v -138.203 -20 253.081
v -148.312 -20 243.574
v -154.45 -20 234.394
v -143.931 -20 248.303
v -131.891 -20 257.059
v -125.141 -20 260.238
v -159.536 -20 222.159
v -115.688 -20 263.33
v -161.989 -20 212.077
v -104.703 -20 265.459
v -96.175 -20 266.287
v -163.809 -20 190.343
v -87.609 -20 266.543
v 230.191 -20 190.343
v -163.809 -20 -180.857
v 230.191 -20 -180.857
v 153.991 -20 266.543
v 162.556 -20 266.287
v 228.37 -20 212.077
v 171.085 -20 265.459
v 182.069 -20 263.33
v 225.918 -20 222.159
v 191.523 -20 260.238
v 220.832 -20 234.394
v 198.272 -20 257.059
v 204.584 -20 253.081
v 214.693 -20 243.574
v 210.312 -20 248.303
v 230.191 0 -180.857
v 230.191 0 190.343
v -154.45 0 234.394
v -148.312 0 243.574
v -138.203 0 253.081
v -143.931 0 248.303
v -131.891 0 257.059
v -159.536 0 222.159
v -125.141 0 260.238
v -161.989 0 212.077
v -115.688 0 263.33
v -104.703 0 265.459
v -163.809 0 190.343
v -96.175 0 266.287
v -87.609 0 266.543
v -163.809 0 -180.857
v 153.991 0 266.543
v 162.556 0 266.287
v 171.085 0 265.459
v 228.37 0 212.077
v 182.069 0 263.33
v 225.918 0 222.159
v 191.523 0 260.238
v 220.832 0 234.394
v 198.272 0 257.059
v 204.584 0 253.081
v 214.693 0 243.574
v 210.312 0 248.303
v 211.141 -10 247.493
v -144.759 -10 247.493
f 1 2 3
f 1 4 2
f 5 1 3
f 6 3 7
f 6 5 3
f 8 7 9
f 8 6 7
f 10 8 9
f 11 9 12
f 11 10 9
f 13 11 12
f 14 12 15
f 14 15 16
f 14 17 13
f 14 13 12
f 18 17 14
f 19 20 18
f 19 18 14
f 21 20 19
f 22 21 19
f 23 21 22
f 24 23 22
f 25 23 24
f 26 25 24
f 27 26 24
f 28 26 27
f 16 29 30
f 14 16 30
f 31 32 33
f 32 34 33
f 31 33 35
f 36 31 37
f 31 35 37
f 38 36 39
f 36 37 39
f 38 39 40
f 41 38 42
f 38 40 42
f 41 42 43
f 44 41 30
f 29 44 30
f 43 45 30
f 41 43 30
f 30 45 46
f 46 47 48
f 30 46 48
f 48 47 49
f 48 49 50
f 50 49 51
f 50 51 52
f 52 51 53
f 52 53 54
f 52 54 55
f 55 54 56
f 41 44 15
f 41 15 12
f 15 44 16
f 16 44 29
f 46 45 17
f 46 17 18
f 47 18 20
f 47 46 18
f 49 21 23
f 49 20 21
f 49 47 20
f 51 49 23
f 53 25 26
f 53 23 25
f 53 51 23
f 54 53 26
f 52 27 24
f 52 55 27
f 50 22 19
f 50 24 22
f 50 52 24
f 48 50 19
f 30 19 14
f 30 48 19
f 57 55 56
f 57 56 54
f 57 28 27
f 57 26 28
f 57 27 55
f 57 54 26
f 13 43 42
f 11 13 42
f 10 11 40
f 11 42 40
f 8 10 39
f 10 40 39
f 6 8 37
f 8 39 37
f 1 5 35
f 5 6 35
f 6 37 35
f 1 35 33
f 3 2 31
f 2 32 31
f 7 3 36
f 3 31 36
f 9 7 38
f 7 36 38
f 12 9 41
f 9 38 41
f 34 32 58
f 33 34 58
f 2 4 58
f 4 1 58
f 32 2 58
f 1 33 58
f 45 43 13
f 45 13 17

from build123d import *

# Parameters (mm, degrees)
F0_W        = 394
F0_H        = 447.4
F1_DEPTH    = 20
F2_T1_DEPTH = 401


# Not quite as in the source:
# - a fillet or chamfer that OpenCascade refuses, or shapes differently, is made with other operations: its cross-section is extruded or revolved along the edge and cut away or added


with BuildPart() as f1:
    # F0 (on Front) → F1 (new body)
    with BuildSketch(Plane.XZ):
        with Locations((33.1907154322, 42.8427122533)):
            Rectangle(F0_W, F0_H)
    extrude(amount=F1_DEPTH)

    # F2: fillet of radius 76.2 on 2 edges, made by hand

    # F2_s2 → F2_t1 (cut)
    with BuildSketch(Plane.XZ.offset(-190.5)):
        with BuildLine():
            add(Edge.make_bspline(
                [(153.9907154322, 266.5427122533), (230.1907154322, 266.5427122533), (230.1907154322, 190.3427122533)],
                knots=[0, 0, 0, 1, 1, 1], degree=2, weights=[1, 1, 1]))
            Line((230.1907154322, 190.3427122533), (230.1907154322, 266.5427122533))
            Line((230.1907154322, 266.5427122533), (153.9907154322, 266.5427122533))
        make_face()
        with BuildLine():
            add(Edge.make_bspline(
                [(-87.6092845678, 266.5427122533), (-163.8092845678, 266.5427122533), (-163.8092845678, 190.3427122533)],
                knots=[0, 0, 0, 1, 1, 1], degree=2, weights=[1, 1, 1]))
            Line((-163.8092845678, 190.3427122533), (-163.8092845678, 266.5427122533))
            Line((-163.8092845678, 266.5427122533), (-87.6092845678, 266.5427122533))
        make_face()
    extrude(amount=F2_T1_DEPTH, mode=Mode.SUBTRACT)


solid = f1.part
